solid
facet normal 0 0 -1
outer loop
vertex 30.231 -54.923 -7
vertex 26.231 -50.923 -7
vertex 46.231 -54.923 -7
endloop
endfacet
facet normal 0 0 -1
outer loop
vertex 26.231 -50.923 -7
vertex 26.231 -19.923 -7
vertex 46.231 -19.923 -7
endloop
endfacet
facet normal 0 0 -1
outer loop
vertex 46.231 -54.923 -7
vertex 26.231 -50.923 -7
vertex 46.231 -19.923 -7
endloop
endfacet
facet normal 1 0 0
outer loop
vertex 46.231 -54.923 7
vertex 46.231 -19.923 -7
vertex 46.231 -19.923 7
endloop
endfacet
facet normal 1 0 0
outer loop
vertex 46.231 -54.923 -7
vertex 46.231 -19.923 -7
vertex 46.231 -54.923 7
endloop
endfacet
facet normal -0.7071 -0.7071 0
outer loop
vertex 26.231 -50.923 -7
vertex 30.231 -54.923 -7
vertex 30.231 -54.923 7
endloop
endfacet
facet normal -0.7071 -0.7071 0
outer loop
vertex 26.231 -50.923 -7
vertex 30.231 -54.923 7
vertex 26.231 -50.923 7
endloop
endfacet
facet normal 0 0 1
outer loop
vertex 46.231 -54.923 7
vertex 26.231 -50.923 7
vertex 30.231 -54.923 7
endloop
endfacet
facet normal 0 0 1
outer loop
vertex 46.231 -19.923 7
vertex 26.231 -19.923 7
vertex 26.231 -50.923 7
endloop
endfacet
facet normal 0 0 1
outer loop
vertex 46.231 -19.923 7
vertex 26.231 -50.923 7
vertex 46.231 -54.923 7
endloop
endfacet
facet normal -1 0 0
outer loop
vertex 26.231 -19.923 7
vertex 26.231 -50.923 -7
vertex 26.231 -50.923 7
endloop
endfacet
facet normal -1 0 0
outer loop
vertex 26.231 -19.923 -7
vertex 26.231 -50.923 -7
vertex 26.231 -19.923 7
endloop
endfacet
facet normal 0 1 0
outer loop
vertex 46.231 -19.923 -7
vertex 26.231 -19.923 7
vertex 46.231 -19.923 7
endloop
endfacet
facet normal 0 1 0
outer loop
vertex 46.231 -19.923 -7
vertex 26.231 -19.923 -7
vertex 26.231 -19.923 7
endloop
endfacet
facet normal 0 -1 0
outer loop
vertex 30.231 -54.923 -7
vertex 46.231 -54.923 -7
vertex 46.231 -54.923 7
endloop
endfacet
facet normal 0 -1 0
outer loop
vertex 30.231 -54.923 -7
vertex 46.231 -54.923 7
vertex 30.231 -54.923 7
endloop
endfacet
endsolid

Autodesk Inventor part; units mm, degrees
ref_plane "YZ Plane" through (0, 0, 0) normal (1, 0, 0) x (0, 1, 0)
ref_plane "XZ Plane" through (0, 0, 0) normal (0, 1, 0) x (-1, 0, 0)
ref_plane "XY Plane" through (0, 0, 0) normal (0, 0, 1) x (1, 0, 0)
sketch "Skizze1" plane through (0, 0, 0) normal (0, 0, 1) x (1, 0, 0)
  line L0 (26.2311, -50.9228) -> (26.2311, -19.9228)
  line L1 (26.2311, -19.9228) -> (46.2311, -19.9228)
  line L2 (46.2311, -19.9228) -> (46.2311, -54.9228)
  line L3 (46.2311, -54.9228) -> (30.2311, -54.9228)
  line L4 (30.2311, -54.9228) -> (26.2311, -50.9228)
  point P0 (0, 0)
  dimension "d0" = 45
  dimension "d1" = 4
  dimension "d2" = 20
  dimension "d4" = 35
extrude "Extrusion1" add sketch "Skizze1" along normal mid plane 14
properties part number "_WT_Aufnahme_Antriebseinheit1"
